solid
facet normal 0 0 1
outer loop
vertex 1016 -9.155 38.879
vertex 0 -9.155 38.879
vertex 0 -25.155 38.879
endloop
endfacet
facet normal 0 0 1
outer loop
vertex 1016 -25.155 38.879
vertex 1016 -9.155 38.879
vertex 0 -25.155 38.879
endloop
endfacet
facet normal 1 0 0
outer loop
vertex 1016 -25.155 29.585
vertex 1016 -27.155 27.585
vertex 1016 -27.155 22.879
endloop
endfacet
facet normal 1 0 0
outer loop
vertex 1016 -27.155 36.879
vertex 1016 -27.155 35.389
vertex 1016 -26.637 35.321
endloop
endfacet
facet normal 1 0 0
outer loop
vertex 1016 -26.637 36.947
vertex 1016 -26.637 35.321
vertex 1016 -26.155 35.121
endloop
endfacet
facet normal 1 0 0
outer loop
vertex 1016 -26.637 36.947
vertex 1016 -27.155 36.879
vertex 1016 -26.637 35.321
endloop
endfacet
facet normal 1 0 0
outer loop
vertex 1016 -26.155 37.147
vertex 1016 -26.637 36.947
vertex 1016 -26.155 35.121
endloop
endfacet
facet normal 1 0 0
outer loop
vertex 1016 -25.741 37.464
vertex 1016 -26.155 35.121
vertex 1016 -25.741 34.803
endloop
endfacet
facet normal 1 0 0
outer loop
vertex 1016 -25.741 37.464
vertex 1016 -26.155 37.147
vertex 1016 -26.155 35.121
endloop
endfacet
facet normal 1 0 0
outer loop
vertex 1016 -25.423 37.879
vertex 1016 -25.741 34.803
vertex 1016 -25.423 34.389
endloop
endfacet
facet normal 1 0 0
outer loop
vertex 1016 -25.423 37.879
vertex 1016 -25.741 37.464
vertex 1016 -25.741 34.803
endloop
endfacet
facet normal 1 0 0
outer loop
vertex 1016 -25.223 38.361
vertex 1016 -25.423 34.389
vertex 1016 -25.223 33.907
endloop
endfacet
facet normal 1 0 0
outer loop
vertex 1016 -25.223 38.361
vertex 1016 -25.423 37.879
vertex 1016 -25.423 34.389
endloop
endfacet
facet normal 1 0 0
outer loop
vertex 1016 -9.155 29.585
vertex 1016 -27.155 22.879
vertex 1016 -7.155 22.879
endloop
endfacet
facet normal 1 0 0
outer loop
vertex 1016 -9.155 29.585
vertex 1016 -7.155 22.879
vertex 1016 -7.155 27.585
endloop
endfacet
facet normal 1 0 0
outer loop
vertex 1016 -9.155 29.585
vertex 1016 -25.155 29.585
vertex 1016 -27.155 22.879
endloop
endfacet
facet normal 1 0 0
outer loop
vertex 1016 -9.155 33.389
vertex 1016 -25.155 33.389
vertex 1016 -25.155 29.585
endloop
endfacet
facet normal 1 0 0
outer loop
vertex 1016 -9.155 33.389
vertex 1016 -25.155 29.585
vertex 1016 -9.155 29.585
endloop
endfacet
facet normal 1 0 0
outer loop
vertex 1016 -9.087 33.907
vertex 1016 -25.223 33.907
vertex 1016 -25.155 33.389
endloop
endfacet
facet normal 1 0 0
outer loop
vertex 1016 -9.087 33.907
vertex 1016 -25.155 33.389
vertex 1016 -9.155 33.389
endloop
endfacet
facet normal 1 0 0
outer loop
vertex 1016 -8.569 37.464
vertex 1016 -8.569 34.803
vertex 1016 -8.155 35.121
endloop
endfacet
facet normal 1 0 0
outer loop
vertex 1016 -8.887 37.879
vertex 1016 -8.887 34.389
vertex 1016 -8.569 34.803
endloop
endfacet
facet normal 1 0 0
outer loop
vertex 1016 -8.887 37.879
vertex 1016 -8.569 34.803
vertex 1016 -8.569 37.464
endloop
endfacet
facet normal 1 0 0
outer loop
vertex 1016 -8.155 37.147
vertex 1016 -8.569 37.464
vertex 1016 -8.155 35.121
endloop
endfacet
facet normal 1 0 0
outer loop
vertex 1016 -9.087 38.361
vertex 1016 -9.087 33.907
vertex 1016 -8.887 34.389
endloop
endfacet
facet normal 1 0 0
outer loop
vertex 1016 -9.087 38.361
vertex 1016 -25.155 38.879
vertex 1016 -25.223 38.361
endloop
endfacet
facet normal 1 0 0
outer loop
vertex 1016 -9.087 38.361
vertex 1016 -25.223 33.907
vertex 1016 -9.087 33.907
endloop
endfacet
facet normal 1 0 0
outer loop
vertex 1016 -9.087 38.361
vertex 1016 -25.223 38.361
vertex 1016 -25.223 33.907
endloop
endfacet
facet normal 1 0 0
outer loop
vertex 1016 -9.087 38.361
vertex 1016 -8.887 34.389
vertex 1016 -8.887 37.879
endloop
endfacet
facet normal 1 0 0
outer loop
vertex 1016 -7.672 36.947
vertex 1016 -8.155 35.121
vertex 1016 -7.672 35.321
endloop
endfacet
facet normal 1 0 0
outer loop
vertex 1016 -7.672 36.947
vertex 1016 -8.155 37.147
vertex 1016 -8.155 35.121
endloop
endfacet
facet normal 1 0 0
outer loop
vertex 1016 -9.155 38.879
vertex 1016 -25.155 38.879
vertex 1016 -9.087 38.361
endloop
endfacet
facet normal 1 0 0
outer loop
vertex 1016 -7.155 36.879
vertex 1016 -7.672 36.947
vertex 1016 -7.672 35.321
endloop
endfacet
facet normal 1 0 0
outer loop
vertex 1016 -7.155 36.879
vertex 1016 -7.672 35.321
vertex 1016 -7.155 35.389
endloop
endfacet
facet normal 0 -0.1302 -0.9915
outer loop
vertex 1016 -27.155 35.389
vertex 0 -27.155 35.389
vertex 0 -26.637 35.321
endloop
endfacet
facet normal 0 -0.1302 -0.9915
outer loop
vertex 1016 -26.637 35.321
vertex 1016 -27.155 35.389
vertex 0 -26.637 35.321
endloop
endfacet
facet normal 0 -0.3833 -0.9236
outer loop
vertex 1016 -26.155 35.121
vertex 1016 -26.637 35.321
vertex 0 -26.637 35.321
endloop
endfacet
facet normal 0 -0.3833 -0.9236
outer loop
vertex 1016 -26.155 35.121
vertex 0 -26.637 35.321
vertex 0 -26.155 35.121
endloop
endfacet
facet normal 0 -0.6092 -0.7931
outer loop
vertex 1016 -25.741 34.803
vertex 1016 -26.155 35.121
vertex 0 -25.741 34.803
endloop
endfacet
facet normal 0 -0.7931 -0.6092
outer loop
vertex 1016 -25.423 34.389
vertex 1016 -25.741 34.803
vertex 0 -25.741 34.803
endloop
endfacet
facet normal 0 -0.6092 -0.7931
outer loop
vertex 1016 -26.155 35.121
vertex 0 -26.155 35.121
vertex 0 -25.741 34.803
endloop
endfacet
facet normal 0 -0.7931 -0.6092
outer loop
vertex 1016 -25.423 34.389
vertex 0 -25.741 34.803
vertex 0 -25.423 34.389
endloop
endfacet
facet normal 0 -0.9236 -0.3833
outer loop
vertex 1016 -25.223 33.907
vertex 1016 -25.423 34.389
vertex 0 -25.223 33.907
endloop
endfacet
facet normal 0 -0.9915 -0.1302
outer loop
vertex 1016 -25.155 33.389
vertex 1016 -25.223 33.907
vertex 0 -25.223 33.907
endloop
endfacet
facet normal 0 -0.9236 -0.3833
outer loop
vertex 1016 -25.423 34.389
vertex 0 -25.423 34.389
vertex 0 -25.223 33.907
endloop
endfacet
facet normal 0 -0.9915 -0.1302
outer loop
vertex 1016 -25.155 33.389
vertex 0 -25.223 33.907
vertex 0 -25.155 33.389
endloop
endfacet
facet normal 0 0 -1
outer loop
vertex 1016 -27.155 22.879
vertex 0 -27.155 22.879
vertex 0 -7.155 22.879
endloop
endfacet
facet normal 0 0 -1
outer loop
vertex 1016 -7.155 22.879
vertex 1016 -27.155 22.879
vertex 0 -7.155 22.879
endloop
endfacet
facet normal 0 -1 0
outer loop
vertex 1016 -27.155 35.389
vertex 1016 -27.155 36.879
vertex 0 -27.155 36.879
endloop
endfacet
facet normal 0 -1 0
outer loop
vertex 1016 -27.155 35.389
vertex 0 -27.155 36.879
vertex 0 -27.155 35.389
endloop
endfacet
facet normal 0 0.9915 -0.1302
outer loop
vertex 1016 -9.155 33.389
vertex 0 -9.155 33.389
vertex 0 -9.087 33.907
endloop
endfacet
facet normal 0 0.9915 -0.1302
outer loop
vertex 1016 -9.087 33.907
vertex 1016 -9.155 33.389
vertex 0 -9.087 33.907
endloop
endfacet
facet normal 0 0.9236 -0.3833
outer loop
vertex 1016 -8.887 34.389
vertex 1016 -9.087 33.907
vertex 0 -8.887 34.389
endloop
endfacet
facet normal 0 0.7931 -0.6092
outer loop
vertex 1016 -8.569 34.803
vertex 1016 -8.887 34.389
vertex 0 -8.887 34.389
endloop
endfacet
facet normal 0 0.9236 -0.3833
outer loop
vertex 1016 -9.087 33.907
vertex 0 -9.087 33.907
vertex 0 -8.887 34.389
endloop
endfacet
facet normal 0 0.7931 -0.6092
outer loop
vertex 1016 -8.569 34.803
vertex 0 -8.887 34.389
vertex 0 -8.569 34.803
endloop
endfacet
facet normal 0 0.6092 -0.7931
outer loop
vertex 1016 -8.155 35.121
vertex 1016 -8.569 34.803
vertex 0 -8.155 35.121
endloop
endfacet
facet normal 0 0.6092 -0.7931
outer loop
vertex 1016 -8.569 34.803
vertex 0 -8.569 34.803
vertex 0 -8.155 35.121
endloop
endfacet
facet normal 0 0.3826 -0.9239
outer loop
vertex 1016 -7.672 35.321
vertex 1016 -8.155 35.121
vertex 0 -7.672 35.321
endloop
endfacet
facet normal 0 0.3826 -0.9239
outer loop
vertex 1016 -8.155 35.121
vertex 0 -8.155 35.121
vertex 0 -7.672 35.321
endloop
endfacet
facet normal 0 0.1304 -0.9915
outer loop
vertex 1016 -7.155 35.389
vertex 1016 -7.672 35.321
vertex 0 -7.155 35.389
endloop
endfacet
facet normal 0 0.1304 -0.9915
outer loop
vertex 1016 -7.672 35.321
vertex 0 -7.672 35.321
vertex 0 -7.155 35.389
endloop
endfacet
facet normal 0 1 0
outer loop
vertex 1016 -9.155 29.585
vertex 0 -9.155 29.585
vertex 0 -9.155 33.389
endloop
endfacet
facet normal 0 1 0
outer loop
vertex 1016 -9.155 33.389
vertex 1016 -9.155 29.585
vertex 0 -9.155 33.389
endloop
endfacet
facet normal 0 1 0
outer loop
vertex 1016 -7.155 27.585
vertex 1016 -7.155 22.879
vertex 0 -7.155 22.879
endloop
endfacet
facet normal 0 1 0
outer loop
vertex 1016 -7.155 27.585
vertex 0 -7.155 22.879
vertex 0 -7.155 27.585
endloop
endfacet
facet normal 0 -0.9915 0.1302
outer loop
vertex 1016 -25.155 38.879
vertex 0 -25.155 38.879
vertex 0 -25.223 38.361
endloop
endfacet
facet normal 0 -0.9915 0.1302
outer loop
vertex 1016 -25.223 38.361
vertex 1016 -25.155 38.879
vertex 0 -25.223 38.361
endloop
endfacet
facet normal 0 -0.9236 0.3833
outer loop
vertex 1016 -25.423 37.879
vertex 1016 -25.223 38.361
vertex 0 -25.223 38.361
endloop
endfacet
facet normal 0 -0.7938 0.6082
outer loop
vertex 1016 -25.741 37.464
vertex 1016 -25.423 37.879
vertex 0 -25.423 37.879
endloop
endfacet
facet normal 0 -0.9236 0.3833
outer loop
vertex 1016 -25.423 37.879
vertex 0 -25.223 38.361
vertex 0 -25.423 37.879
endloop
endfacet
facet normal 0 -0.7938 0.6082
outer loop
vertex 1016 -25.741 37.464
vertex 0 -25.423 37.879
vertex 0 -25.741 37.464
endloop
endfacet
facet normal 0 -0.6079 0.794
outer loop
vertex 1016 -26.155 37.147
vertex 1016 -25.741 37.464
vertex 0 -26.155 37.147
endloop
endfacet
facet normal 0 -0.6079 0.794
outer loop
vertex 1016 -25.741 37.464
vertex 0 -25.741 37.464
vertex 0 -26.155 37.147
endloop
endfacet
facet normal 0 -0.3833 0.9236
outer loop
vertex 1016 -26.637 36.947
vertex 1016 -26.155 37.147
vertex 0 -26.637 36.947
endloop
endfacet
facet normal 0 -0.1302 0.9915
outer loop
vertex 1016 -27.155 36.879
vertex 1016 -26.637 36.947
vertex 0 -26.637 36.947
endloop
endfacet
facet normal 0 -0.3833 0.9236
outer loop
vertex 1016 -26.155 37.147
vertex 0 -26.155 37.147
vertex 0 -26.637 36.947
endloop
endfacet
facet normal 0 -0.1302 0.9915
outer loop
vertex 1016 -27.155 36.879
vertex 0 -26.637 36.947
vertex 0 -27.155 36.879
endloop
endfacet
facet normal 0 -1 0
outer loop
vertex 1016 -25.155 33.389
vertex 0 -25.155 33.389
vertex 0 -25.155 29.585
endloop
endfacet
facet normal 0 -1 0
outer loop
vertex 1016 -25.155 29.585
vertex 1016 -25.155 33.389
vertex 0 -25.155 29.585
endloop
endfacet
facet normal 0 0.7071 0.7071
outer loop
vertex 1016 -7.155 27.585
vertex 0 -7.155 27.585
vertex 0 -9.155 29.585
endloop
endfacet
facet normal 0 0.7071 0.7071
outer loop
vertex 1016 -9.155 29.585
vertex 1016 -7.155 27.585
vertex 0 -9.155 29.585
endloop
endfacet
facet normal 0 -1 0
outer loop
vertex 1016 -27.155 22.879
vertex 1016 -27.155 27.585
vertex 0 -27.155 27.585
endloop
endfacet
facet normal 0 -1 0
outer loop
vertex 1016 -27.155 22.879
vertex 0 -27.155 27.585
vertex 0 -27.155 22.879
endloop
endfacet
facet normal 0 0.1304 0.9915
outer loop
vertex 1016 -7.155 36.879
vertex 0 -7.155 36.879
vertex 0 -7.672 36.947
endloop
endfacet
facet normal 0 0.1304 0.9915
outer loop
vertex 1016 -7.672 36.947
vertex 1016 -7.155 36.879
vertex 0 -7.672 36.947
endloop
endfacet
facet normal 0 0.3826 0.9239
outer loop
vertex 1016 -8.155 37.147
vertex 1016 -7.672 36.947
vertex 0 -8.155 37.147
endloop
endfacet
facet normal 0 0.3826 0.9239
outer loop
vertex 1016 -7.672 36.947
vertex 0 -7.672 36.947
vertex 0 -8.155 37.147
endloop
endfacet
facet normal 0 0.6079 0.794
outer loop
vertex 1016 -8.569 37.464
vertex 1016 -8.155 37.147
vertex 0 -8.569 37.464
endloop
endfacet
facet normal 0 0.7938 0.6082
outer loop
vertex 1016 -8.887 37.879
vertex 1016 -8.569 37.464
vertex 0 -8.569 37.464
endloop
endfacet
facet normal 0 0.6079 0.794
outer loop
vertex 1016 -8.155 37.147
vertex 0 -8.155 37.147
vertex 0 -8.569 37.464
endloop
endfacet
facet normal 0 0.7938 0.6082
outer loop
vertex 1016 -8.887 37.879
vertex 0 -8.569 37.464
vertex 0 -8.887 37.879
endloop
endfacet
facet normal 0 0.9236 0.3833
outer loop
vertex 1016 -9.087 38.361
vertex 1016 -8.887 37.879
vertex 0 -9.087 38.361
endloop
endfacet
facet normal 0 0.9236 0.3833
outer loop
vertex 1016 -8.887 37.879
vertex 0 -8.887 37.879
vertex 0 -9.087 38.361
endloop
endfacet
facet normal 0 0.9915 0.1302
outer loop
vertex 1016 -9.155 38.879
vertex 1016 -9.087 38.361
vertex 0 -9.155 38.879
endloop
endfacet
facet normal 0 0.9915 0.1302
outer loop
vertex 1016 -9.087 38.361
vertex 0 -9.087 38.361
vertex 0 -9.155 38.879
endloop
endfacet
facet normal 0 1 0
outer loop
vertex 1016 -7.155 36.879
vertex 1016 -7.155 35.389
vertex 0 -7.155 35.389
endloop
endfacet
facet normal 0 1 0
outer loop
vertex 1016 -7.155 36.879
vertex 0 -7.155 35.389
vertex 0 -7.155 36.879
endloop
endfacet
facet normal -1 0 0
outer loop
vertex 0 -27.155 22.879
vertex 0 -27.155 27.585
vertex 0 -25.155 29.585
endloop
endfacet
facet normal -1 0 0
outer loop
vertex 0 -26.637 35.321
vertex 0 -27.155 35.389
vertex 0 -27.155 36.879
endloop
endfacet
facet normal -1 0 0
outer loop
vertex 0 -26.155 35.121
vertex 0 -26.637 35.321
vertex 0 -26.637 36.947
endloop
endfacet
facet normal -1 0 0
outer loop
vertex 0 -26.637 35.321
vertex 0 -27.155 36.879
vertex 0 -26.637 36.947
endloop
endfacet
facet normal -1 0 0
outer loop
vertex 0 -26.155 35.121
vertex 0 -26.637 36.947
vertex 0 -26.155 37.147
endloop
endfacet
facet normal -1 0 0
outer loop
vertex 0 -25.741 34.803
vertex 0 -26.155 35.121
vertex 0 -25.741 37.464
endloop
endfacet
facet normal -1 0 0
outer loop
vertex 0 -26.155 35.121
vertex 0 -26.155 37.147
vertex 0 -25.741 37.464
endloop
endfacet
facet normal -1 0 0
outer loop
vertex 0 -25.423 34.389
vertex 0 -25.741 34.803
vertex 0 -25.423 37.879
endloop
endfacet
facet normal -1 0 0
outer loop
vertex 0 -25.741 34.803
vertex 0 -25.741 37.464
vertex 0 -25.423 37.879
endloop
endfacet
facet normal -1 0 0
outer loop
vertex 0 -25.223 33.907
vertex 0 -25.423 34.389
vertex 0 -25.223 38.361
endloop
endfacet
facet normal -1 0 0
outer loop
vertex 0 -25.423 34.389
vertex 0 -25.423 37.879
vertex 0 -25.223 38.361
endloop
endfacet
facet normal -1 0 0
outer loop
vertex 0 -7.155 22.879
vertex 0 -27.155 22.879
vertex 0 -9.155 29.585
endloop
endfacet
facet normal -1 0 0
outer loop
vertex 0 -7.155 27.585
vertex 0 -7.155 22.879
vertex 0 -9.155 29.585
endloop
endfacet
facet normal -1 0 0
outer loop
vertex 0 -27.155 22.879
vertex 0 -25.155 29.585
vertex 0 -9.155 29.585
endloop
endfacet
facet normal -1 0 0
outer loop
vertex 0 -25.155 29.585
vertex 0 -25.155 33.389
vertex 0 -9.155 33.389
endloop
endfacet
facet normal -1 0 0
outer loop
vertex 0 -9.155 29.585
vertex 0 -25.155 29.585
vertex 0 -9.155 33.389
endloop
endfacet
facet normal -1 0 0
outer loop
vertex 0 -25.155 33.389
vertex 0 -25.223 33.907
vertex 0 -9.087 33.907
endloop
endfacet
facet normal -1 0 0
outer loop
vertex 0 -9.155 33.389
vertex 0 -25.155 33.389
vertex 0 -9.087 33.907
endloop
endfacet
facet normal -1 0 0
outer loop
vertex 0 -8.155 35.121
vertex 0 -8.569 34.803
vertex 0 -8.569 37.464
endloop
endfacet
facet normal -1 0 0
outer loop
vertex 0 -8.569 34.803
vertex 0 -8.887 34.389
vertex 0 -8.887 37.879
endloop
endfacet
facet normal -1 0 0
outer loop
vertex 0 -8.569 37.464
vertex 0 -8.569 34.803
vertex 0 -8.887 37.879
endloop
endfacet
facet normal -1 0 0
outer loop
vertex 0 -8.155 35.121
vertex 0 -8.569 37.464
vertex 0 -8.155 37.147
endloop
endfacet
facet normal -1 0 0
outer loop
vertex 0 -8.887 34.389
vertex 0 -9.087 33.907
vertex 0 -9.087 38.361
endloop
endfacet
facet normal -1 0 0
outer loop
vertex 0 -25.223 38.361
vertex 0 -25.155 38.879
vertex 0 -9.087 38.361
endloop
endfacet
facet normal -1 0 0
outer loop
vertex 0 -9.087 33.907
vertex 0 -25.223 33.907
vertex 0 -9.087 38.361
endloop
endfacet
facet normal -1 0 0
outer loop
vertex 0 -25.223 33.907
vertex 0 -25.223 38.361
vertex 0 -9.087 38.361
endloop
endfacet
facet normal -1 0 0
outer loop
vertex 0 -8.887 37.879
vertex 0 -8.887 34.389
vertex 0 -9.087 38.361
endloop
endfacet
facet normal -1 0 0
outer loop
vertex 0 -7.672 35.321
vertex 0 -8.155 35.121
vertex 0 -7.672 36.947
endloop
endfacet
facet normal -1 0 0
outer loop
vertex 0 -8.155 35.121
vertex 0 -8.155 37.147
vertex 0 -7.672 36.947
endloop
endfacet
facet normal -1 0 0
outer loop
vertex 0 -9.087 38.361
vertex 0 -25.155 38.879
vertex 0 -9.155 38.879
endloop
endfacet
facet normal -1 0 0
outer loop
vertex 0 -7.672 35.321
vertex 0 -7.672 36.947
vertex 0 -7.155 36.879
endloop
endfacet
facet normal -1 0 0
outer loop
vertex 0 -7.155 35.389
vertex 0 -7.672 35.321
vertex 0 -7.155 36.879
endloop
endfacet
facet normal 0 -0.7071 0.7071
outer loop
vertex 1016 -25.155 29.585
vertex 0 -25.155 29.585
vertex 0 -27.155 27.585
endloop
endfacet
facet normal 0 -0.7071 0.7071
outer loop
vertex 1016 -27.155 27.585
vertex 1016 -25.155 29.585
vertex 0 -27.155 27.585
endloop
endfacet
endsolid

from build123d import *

# Parameters (mm, degrees)
F1_DEPTH = 1016


with BuildPart() as f1:
    # F0 (on Right) → F1 (new body)
    with BuildSketch(Plane.YZ):
        Polygon((-27.154803, 22.878646), (-7.154803, 22.878646), (-7.154803, 27.584923), (-9.154803, 29.584923), (-9.154803, 33.389069), (-25.154803, 33.389069), (-25.154803, 29.584923), (-27.154803, 27.584923), align=None)
        with BuildLine():
            ThreePointArc((-9.154803, 33.389069), (-8.569017, 34.803283), (-7.154803, 35.389069))
            Line((-7.154803, 35.389069), (-7.154803, 36.878646))
            ThreePointArc((-7.154803, 36.878646), (-8.569017, 37.464433), (-9.154803, 38.878646))
            Line((-9.154803, 38.878646), (-25.154803, 38.878646))
            ThreePointArc((-25.154803, 38.878646), (-25.74059, 37.464433), (-27.154803, 36.878646))
            Line((-27.154803, 36.878646), (-27.154803, 35.389069))
            ThreePointArc((-27.154803, 35.389069), (-25.74059, 34.803283), (-25.154803, 33.389069))
            Line((-25.154803, 33.389069), (-9.154803, 33.389069))
        make_face()
    extrude(amount=F1_DEPTH)


solid = f1.part
